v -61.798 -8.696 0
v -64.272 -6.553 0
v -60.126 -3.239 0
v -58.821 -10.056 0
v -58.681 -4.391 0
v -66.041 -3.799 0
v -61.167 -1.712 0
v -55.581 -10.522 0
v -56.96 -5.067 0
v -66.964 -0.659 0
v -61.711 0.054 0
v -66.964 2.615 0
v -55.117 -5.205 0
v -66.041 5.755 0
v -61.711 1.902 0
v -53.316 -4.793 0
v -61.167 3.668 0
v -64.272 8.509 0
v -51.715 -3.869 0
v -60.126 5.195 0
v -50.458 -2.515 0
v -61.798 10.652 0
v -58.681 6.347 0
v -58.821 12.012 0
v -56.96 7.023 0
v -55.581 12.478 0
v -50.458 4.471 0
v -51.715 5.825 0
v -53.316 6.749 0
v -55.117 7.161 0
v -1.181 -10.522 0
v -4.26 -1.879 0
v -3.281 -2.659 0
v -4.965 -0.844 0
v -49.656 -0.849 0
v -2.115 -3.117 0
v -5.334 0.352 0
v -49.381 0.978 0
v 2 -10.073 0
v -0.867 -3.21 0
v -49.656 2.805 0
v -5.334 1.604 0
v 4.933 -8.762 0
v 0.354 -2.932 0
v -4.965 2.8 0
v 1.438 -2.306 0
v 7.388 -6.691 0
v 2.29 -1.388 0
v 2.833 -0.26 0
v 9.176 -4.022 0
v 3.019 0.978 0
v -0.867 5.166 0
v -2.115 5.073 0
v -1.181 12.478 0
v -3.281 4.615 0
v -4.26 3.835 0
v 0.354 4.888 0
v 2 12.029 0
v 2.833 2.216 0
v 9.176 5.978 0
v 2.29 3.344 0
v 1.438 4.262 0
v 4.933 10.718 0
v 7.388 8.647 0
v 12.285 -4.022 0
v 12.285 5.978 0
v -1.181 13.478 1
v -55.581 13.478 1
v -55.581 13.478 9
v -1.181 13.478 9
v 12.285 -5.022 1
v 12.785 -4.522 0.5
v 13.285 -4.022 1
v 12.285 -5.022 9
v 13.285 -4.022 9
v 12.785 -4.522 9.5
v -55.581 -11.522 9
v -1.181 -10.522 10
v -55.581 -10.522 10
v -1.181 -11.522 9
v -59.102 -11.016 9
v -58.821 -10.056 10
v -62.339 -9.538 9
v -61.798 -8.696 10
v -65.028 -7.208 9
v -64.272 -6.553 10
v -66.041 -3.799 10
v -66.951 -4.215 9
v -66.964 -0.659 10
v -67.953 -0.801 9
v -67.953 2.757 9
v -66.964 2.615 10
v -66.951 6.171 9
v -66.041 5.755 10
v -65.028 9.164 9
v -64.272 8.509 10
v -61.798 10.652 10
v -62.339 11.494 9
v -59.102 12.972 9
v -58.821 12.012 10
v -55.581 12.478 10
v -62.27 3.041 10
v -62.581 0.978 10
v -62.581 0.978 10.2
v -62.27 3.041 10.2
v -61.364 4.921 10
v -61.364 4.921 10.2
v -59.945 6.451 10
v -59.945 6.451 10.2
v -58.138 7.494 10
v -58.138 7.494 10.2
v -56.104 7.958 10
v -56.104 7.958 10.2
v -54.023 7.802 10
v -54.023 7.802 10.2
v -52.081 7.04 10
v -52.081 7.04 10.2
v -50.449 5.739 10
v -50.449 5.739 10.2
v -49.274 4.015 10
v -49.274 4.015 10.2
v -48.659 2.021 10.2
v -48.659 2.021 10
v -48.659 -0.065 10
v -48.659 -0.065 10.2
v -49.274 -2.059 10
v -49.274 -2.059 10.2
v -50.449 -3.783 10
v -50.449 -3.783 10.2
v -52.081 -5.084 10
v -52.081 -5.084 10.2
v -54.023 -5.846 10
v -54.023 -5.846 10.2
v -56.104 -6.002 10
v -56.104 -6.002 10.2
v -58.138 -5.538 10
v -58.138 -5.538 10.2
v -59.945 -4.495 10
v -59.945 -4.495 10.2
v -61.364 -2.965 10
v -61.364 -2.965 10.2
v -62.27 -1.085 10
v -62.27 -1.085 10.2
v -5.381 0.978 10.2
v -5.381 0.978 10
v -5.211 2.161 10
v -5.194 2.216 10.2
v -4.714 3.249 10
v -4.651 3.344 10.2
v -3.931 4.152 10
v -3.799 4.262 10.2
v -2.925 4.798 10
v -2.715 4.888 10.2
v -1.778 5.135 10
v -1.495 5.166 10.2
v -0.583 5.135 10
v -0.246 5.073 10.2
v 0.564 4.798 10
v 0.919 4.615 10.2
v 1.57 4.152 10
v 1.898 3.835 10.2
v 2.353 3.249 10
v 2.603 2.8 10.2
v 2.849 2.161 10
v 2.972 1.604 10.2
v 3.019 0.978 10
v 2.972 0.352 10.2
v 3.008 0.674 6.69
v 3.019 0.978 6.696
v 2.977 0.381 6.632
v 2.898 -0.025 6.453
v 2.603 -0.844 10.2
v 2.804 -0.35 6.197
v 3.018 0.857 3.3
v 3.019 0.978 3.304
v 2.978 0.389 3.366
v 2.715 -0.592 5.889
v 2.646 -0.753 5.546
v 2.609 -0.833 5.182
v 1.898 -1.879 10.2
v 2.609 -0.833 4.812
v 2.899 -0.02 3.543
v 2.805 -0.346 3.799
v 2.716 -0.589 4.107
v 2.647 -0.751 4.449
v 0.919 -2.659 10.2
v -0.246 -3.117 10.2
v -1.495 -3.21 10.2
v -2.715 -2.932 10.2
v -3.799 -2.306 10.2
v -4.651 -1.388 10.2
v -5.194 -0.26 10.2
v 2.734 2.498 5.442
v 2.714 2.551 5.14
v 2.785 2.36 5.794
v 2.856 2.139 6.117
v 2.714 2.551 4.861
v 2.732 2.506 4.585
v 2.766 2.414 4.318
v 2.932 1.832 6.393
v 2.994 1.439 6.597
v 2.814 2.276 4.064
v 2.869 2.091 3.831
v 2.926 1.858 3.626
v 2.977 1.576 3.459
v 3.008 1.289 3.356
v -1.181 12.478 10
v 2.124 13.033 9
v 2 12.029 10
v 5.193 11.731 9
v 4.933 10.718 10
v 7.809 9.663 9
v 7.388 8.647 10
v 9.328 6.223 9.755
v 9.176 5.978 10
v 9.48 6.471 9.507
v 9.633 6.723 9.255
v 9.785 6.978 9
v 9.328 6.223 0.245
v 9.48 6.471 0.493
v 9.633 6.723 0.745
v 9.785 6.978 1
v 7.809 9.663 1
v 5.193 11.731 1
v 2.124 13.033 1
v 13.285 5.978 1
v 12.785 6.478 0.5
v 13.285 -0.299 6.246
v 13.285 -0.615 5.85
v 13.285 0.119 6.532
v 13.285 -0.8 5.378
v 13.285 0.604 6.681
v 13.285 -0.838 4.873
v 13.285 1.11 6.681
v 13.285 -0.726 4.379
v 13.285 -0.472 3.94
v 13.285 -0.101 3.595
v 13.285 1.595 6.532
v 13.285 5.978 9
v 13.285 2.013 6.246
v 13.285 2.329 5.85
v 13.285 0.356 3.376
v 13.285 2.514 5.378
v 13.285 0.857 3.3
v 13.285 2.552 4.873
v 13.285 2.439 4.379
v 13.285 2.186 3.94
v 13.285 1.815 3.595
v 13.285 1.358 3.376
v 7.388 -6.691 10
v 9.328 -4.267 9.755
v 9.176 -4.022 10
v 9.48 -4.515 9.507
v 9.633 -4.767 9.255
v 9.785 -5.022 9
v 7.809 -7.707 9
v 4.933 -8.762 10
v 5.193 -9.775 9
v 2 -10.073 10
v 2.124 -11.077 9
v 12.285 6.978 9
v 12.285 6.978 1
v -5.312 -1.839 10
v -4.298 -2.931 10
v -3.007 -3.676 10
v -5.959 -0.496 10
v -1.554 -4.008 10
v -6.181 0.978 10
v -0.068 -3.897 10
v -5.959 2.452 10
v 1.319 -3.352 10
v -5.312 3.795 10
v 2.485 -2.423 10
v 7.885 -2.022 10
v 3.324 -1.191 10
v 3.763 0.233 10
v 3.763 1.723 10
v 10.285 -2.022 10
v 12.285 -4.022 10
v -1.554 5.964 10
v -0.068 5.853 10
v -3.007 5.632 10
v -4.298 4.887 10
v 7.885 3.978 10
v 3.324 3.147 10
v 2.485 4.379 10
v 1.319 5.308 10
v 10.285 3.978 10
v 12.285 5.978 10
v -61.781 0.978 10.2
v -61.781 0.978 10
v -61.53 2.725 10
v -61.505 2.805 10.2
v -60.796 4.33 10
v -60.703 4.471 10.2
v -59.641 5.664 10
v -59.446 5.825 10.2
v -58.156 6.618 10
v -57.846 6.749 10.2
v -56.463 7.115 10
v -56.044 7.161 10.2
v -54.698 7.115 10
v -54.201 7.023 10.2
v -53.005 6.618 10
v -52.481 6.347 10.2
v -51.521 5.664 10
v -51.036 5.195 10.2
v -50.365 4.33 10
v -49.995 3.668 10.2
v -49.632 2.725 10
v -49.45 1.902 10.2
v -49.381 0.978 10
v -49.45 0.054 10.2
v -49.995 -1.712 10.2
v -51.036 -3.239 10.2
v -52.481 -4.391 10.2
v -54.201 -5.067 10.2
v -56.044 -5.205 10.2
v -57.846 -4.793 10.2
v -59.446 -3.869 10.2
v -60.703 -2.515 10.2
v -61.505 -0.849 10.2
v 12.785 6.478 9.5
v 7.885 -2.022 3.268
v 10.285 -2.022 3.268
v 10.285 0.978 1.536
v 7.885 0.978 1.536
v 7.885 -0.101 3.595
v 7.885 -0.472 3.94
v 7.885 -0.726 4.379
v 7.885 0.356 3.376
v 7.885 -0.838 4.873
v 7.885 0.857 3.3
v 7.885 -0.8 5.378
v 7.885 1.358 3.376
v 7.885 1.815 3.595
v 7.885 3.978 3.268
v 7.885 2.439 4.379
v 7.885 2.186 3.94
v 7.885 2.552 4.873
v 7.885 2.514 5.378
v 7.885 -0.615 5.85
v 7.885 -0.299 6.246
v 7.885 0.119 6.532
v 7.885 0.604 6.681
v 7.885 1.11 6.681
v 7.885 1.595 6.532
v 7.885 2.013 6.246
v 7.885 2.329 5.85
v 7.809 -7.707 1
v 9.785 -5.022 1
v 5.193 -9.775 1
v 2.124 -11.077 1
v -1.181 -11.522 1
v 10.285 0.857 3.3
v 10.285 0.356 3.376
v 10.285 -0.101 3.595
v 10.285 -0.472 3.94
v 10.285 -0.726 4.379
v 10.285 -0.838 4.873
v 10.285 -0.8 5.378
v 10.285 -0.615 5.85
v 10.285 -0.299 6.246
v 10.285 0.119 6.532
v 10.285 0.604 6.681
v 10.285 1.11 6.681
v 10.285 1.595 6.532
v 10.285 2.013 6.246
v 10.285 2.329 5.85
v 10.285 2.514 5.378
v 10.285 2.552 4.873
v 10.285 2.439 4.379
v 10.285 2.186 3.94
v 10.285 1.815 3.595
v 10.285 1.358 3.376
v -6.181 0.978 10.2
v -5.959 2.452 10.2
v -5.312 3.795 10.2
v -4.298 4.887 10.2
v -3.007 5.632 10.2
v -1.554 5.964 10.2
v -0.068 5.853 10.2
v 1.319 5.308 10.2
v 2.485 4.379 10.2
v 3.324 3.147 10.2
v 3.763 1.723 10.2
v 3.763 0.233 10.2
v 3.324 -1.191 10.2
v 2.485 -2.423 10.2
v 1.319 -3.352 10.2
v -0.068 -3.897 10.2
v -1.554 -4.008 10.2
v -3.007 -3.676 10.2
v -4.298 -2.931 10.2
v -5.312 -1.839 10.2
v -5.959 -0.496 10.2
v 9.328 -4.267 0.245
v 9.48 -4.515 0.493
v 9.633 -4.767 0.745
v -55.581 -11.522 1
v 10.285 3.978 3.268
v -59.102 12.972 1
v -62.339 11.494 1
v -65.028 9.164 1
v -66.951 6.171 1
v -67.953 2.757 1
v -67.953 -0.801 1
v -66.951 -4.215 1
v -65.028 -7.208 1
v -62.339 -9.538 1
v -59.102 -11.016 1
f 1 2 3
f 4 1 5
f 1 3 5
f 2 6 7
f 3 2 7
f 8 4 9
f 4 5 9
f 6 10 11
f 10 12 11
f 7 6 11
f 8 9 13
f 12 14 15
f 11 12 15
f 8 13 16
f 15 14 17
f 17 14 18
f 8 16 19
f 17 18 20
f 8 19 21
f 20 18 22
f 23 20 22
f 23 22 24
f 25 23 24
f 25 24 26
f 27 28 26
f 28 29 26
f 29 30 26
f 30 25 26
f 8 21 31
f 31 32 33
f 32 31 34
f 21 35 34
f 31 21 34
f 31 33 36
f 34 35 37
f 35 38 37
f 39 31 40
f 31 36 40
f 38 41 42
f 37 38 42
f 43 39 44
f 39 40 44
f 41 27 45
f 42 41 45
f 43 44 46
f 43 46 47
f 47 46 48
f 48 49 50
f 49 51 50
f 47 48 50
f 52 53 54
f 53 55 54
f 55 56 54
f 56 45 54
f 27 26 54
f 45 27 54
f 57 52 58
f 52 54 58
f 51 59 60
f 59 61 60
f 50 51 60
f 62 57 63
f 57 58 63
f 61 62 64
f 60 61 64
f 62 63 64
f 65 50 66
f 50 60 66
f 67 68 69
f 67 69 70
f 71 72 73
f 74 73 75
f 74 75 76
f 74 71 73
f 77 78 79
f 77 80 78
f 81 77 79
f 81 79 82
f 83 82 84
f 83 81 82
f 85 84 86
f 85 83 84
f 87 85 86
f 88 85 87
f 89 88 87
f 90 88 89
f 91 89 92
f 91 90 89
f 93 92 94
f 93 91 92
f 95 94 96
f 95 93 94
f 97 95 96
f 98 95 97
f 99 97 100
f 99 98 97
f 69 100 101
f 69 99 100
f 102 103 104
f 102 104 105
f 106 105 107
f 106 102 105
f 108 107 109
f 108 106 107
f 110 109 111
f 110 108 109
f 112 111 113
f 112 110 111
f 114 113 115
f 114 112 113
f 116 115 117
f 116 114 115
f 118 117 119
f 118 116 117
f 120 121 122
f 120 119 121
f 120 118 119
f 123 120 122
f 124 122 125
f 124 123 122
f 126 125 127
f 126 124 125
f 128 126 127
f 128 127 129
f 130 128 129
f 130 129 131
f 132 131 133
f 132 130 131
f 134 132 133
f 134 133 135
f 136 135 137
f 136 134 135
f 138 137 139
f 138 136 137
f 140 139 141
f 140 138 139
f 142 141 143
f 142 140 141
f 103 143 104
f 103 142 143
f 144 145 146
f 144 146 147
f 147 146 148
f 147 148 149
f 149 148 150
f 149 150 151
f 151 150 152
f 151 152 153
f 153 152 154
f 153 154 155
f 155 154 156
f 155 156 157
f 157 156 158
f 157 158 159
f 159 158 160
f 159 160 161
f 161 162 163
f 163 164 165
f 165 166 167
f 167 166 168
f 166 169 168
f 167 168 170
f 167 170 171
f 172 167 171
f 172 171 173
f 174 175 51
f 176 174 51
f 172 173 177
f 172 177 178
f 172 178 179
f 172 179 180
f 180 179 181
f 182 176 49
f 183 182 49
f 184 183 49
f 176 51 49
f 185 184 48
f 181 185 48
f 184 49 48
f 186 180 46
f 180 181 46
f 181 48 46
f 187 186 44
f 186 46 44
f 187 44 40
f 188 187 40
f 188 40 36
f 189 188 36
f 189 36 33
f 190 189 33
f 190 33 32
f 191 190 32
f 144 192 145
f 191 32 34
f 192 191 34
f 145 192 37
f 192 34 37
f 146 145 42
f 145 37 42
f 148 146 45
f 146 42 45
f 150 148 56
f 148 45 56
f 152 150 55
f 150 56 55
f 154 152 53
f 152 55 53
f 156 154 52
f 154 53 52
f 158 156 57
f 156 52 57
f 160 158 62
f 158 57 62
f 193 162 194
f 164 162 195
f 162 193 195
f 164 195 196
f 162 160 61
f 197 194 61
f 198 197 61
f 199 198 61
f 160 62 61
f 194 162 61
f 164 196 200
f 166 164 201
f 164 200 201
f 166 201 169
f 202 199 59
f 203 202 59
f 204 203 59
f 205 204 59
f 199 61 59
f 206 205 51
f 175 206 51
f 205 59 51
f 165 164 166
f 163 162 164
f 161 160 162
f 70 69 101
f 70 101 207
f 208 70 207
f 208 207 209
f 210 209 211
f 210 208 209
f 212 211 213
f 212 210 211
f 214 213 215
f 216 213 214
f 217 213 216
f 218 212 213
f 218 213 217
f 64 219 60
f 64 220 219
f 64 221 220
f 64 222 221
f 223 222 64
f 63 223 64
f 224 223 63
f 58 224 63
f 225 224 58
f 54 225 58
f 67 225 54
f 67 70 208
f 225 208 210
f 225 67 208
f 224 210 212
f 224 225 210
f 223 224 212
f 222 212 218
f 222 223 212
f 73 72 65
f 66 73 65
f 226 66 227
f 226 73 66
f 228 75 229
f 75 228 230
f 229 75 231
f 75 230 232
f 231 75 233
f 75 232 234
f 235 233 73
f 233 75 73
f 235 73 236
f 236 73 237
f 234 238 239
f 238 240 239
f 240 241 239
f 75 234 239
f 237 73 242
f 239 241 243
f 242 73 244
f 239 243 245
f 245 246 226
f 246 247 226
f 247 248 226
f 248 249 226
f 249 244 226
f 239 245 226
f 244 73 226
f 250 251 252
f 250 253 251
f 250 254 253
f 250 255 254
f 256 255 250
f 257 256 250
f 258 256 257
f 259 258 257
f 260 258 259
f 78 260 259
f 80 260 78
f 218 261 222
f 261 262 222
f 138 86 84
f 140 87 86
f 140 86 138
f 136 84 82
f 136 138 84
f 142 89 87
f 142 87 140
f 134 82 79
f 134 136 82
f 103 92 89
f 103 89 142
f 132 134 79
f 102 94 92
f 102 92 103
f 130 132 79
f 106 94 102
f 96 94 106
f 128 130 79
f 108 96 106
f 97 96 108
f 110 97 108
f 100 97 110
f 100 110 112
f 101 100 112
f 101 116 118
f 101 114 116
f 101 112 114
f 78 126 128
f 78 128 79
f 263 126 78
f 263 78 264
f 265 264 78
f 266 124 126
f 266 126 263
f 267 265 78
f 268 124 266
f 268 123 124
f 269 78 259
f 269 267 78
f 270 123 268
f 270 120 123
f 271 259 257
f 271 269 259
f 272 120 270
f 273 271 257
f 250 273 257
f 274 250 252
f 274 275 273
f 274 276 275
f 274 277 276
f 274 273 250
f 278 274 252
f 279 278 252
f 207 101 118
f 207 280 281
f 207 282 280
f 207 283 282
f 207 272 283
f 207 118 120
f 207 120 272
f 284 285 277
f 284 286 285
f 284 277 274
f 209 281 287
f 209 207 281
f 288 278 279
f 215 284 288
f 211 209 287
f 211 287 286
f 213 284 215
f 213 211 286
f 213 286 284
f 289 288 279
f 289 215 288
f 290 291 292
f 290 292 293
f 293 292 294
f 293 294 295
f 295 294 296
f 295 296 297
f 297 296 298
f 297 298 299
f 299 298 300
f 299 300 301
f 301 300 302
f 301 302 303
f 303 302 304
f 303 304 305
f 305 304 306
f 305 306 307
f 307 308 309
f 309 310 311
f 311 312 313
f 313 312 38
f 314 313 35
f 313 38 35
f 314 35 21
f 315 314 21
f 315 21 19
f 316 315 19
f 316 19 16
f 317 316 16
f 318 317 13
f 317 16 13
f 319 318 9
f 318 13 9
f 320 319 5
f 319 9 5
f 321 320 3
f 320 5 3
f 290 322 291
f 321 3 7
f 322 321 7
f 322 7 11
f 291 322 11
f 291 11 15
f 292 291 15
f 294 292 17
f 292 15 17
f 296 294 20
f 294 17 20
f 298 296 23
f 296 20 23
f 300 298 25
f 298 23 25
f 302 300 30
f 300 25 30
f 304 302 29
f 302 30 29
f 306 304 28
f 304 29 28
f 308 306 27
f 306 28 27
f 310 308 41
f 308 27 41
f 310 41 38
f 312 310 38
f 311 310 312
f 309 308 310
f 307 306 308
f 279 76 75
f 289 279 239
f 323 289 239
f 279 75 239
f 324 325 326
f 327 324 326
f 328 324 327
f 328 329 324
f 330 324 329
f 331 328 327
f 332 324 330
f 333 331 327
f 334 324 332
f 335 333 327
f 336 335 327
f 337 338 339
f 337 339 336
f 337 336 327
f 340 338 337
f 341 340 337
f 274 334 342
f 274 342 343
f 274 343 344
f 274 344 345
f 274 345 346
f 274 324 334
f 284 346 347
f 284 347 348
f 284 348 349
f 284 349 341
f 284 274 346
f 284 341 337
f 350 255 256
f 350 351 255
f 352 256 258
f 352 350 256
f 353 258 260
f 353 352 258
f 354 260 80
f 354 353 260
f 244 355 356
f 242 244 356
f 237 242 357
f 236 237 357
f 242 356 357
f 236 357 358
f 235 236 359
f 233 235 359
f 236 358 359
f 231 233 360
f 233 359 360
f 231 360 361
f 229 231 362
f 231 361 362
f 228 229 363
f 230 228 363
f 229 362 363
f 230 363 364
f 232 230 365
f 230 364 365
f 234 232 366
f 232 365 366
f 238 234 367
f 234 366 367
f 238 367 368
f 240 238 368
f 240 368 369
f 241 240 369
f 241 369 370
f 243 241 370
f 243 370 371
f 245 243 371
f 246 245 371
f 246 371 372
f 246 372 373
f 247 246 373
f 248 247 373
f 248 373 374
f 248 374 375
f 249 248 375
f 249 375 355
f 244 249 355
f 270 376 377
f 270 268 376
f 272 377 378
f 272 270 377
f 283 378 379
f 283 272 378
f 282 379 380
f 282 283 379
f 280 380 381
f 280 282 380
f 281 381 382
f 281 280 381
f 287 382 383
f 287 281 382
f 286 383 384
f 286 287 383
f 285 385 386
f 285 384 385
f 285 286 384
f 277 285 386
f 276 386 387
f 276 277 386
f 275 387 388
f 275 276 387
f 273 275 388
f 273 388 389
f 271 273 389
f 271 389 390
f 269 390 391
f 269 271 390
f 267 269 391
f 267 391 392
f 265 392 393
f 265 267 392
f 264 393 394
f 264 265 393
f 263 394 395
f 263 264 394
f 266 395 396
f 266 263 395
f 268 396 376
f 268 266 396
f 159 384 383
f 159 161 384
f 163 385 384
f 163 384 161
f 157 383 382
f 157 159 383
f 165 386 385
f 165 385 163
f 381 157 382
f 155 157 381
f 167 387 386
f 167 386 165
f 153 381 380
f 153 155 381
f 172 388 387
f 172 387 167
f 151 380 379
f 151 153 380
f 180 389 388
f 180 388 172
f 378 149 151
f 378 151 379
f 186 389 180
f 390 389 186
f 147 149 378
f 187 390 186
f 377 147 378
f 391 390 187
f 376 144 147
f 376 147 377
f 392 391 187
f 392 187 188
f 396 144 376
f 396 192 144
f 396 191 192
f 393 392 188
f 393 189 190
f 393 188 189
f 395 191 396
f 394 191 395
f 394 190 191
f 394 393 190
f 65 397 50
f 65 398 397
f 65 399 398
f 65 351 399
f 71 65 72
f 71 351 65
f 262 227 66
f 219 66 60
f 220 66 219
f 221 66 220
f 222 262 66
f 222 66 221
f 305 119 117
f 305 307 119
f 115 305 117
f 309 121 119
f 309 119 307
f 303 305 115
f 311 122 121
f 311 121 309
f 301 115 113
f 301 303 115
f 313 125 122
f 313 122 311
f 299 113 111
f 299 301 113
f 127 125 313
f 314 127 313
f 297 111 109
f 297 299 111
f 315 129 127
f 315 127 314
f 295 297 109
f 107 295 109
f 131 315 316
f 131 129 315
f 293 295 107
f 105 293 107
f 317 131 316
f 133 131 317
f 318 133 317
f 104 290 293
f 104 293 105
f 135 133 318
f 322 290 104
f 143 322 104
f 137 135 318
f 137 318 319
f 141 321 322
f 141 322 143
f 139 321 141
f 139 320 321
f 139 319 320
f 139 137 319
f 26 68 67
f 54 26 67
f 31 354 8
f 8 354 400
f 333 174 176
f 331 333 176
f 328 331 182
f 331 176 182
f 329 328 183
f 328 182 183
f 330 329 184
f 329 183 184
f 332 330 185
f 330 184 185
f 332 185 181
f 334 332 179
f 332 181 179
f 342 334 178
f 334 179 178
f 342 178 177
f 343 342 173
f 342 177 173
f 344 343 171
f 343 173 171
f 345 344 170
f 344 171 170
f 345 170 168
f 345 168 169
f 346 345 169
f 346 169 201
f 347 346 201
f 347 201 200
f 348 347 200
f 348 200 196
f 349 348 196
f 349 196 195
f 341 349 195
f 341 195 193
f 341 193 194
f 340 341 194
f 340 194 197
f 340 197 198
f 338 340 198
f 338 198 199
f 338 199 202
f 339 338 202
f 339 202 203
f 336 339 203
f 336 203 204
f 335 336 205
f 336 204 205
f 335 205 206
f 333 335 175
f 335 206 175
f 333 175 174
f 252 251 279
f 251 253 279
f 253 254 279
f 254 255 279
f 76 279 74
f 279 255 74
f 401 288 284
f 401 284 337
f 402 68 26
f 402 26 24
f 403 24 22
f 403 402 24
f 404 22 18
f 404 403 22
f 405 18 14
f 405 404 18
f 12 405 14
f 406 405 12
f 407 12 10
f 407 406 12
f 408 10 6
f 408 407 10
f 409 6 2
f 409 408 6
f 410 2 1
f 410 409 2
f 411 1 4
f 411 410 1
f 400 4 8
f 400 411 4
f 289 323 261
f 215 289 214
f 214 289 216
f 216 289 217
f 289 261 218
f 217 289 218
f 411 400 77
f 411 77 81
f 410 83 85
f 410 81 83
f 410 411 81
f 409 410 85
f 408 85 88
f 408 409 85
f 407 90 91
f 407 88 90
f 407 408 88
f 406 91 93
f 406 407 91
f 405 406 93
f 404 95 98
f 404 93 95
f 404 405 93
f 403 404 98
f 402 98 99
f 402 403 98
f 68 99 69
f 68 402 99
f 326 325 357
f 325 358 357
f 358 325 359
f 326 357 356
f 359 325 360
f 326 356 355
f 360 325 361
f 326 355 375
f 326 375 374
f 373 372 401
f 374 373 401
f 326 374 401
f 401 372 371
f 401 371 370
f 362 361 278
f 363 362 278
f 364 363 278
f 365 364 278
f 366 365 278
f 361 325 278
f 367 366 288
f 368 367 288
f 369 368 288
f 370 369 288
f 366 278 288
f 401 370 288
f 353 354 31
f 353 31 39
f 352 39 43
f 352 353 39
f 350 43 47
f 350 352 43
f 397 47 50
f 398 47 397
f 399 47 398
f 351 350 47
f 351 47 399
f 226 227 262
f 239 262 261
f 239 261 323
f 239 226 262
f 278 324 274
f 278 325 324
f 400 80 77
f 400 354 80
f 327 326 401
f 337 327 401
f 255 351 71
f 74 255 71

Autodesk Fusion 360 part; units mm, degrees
sketch "Esquisse1" plane through (0, 0, 0) normal (0, 0, 1) x (1, 0, 0)
  circle A0 centre (-55.5807, 0.978) radius 6.2
  circle A1 centre (-1.1807, 0.978) radius 4.2
  line L0 (-55.5807, 13.478) -> (-1.1807, 13.478)
  line L1 (-1.1807, 13.478) -> (-1.1807, -11.522) construction
  line L2 (-1.1807, -11.522) -> (-55.5807, -11.522)
  line L3 (-55.5807, -11.522) -> (-55.5807, 13.478) construction
  arc A2 (-55.5807, 13.478) -> (-55.5807, -11.522) centre (-55.5807, 0.978) ccw
  line L4 (9.7852, -5.022) -> (13.2852, -5.022)
  line L5 (13.2852, -5.022) -> (13.2852, 6.978)
  line L6 (13.2852, 6.978) -> (9.7852, 6.978)
  arc A3 (-1.1807, -11.522) -> (9.7852, -5.022) centre (-1.1807, 0.978) ccw
  arc A4 (9.7852, 6.978) -> (-1.1807, 13.478) centre (-1.1807, 0.978) ccw
  dimension "d1" = 54.4
  dimension "d2" = 12.4
  dimension "d3" = 8.4
  dimension "d4" = 25
  dimension "d5" = 12.5
  dimension "d7" = 12
  dimension "d8" = 3.5
extrude "Extrusion1" add sketch "Esquisse1" along normal blind 10
sketch "Esquisse2" plane through (0, 0, 10) normal (0, 0, 1) x (-1, 0, 0)
  circle A0 centre (55.5807, -0.978) radius 6.2
  circle A1 centre (1.1807, -0.978) radius 4.2
  arc A2 (1.1807, 11.522) -> (-9.7852, 5.022) centre (1.1807, -0.978) ccw
  line L0 (-9.7852, 5.022) -> (-13.2852, 5.022)
  line L1 (-13.2852, 5.022) -> (-13.2852, -6.978)
  line L2 (-13.2852, -6.978) -> (-9.7852, -6.978)
  arc A3 (-9.7852, -6.978) -> (1.1807, -13.478) centre (1.1807, -0.978) ccw
  line L3 (1.1807, -13.478) -> (55.5807, -13.478)
  arc A4 (55.5807, -13.478) -> (55.5807, 11.522) centre (55.5807, -0.978) ccw
  line L4 (55.5807, 11.522) -> (1.1807, 11.522)
  circle A5 centre (55.5807, -0.978) radius 7
  circle A6 centre (1.1807, -0.978) radius 5
  dimension "d11" = 14
  dimension "d12" = 10
extrude "Extrusion2" add sketch "Esquisse2" along normal blind 0.2 contours A5 | A6
ref_plane "Plan de construction2" through (10.2852, 0.978, 5) normal (1, 0, 0) x (0, 1, 0)
sketch "Esquisse3" plane through (10.2852, 0, 0) normal (1, 0, 0) x (0, 1, 0)
  line L0 (-5.022, 0) -> (6.978, 0)
  line L1 (6.978, 0) -> (6.978, 10)
  line L2 (6.978, 10) -> (-5.022, 10)
  line L3 (-5.022, 10) -> (-5.022, 0)
  line L4 (-2.022, 10) -> (3.978, 10)
  line L5 (3.978, 10) -> (3.978, 5)
  line L6 (3.978, 5) -> (-2.022, 5) construction
  line L7 (-2.022, 5) -> (-2.022, 10)
  line L8 (0.978, 5) -> (0.978, 1.9) construction
  line L9 (-2.022, 6.7321) -> (-2.022, 3.2679)
  line L10 (-2.022, 3.2679) -> (0.978, 1.5359)
  line L11 (0.978, 1.5359) -> (3.978, 3.2679)
  line L12 (3.978, 3.2679) -> (3.978, 6.7321)
  point P0 (0.978, 5)
  dimension "d15" = 3.1
  dimension "d16" = 5
  dimension "d17" = 6
  dimension "d18" = 12
  dimension "d19" = 3
extrude "Extrusion3" cut sketch "Esquisse3" against normal blind 2.4 contours L2 L4 L5 L7 L9 L10 L11 L12
hole "Perçage1" at (13.2852, 0.8569, 5) direction (-1, 0, 0) diameter 3.4 depth 11 tip angle 180
chamfer "Chanfrein1" distance 1 angle 45 16 edges at (5.1931, -9.7749, 10) (5.1931, 11.7309, 10) (-28.3807, 13.478, 10) (-68.0807, 0.978, 10) (-28.3807, -11.522, 10) (-28.3807, -11.522, 0) (-68.0807, 0.978, 0) (-28.3807, 13.478, 0) (5.1931, 11.7309, 0) (5.1931, -9.7749, 0) (11.5352, -5.022, 0) (11.5352, -5.022, 10) (13.2852, 0.978, 0) (13.2852, 0.978, 10) (11.5352, 6.978, 10) (11.5352, 6.978, 0)
chamfer "Chanfrein2" distance 1 angle 45 2 edges at (13.2852, 6.978, 5) (13.2852, -5.022, 5)
equation "d5 = d4 / 2"
equation "d19 = ( d18 - d17 ) / 2"
